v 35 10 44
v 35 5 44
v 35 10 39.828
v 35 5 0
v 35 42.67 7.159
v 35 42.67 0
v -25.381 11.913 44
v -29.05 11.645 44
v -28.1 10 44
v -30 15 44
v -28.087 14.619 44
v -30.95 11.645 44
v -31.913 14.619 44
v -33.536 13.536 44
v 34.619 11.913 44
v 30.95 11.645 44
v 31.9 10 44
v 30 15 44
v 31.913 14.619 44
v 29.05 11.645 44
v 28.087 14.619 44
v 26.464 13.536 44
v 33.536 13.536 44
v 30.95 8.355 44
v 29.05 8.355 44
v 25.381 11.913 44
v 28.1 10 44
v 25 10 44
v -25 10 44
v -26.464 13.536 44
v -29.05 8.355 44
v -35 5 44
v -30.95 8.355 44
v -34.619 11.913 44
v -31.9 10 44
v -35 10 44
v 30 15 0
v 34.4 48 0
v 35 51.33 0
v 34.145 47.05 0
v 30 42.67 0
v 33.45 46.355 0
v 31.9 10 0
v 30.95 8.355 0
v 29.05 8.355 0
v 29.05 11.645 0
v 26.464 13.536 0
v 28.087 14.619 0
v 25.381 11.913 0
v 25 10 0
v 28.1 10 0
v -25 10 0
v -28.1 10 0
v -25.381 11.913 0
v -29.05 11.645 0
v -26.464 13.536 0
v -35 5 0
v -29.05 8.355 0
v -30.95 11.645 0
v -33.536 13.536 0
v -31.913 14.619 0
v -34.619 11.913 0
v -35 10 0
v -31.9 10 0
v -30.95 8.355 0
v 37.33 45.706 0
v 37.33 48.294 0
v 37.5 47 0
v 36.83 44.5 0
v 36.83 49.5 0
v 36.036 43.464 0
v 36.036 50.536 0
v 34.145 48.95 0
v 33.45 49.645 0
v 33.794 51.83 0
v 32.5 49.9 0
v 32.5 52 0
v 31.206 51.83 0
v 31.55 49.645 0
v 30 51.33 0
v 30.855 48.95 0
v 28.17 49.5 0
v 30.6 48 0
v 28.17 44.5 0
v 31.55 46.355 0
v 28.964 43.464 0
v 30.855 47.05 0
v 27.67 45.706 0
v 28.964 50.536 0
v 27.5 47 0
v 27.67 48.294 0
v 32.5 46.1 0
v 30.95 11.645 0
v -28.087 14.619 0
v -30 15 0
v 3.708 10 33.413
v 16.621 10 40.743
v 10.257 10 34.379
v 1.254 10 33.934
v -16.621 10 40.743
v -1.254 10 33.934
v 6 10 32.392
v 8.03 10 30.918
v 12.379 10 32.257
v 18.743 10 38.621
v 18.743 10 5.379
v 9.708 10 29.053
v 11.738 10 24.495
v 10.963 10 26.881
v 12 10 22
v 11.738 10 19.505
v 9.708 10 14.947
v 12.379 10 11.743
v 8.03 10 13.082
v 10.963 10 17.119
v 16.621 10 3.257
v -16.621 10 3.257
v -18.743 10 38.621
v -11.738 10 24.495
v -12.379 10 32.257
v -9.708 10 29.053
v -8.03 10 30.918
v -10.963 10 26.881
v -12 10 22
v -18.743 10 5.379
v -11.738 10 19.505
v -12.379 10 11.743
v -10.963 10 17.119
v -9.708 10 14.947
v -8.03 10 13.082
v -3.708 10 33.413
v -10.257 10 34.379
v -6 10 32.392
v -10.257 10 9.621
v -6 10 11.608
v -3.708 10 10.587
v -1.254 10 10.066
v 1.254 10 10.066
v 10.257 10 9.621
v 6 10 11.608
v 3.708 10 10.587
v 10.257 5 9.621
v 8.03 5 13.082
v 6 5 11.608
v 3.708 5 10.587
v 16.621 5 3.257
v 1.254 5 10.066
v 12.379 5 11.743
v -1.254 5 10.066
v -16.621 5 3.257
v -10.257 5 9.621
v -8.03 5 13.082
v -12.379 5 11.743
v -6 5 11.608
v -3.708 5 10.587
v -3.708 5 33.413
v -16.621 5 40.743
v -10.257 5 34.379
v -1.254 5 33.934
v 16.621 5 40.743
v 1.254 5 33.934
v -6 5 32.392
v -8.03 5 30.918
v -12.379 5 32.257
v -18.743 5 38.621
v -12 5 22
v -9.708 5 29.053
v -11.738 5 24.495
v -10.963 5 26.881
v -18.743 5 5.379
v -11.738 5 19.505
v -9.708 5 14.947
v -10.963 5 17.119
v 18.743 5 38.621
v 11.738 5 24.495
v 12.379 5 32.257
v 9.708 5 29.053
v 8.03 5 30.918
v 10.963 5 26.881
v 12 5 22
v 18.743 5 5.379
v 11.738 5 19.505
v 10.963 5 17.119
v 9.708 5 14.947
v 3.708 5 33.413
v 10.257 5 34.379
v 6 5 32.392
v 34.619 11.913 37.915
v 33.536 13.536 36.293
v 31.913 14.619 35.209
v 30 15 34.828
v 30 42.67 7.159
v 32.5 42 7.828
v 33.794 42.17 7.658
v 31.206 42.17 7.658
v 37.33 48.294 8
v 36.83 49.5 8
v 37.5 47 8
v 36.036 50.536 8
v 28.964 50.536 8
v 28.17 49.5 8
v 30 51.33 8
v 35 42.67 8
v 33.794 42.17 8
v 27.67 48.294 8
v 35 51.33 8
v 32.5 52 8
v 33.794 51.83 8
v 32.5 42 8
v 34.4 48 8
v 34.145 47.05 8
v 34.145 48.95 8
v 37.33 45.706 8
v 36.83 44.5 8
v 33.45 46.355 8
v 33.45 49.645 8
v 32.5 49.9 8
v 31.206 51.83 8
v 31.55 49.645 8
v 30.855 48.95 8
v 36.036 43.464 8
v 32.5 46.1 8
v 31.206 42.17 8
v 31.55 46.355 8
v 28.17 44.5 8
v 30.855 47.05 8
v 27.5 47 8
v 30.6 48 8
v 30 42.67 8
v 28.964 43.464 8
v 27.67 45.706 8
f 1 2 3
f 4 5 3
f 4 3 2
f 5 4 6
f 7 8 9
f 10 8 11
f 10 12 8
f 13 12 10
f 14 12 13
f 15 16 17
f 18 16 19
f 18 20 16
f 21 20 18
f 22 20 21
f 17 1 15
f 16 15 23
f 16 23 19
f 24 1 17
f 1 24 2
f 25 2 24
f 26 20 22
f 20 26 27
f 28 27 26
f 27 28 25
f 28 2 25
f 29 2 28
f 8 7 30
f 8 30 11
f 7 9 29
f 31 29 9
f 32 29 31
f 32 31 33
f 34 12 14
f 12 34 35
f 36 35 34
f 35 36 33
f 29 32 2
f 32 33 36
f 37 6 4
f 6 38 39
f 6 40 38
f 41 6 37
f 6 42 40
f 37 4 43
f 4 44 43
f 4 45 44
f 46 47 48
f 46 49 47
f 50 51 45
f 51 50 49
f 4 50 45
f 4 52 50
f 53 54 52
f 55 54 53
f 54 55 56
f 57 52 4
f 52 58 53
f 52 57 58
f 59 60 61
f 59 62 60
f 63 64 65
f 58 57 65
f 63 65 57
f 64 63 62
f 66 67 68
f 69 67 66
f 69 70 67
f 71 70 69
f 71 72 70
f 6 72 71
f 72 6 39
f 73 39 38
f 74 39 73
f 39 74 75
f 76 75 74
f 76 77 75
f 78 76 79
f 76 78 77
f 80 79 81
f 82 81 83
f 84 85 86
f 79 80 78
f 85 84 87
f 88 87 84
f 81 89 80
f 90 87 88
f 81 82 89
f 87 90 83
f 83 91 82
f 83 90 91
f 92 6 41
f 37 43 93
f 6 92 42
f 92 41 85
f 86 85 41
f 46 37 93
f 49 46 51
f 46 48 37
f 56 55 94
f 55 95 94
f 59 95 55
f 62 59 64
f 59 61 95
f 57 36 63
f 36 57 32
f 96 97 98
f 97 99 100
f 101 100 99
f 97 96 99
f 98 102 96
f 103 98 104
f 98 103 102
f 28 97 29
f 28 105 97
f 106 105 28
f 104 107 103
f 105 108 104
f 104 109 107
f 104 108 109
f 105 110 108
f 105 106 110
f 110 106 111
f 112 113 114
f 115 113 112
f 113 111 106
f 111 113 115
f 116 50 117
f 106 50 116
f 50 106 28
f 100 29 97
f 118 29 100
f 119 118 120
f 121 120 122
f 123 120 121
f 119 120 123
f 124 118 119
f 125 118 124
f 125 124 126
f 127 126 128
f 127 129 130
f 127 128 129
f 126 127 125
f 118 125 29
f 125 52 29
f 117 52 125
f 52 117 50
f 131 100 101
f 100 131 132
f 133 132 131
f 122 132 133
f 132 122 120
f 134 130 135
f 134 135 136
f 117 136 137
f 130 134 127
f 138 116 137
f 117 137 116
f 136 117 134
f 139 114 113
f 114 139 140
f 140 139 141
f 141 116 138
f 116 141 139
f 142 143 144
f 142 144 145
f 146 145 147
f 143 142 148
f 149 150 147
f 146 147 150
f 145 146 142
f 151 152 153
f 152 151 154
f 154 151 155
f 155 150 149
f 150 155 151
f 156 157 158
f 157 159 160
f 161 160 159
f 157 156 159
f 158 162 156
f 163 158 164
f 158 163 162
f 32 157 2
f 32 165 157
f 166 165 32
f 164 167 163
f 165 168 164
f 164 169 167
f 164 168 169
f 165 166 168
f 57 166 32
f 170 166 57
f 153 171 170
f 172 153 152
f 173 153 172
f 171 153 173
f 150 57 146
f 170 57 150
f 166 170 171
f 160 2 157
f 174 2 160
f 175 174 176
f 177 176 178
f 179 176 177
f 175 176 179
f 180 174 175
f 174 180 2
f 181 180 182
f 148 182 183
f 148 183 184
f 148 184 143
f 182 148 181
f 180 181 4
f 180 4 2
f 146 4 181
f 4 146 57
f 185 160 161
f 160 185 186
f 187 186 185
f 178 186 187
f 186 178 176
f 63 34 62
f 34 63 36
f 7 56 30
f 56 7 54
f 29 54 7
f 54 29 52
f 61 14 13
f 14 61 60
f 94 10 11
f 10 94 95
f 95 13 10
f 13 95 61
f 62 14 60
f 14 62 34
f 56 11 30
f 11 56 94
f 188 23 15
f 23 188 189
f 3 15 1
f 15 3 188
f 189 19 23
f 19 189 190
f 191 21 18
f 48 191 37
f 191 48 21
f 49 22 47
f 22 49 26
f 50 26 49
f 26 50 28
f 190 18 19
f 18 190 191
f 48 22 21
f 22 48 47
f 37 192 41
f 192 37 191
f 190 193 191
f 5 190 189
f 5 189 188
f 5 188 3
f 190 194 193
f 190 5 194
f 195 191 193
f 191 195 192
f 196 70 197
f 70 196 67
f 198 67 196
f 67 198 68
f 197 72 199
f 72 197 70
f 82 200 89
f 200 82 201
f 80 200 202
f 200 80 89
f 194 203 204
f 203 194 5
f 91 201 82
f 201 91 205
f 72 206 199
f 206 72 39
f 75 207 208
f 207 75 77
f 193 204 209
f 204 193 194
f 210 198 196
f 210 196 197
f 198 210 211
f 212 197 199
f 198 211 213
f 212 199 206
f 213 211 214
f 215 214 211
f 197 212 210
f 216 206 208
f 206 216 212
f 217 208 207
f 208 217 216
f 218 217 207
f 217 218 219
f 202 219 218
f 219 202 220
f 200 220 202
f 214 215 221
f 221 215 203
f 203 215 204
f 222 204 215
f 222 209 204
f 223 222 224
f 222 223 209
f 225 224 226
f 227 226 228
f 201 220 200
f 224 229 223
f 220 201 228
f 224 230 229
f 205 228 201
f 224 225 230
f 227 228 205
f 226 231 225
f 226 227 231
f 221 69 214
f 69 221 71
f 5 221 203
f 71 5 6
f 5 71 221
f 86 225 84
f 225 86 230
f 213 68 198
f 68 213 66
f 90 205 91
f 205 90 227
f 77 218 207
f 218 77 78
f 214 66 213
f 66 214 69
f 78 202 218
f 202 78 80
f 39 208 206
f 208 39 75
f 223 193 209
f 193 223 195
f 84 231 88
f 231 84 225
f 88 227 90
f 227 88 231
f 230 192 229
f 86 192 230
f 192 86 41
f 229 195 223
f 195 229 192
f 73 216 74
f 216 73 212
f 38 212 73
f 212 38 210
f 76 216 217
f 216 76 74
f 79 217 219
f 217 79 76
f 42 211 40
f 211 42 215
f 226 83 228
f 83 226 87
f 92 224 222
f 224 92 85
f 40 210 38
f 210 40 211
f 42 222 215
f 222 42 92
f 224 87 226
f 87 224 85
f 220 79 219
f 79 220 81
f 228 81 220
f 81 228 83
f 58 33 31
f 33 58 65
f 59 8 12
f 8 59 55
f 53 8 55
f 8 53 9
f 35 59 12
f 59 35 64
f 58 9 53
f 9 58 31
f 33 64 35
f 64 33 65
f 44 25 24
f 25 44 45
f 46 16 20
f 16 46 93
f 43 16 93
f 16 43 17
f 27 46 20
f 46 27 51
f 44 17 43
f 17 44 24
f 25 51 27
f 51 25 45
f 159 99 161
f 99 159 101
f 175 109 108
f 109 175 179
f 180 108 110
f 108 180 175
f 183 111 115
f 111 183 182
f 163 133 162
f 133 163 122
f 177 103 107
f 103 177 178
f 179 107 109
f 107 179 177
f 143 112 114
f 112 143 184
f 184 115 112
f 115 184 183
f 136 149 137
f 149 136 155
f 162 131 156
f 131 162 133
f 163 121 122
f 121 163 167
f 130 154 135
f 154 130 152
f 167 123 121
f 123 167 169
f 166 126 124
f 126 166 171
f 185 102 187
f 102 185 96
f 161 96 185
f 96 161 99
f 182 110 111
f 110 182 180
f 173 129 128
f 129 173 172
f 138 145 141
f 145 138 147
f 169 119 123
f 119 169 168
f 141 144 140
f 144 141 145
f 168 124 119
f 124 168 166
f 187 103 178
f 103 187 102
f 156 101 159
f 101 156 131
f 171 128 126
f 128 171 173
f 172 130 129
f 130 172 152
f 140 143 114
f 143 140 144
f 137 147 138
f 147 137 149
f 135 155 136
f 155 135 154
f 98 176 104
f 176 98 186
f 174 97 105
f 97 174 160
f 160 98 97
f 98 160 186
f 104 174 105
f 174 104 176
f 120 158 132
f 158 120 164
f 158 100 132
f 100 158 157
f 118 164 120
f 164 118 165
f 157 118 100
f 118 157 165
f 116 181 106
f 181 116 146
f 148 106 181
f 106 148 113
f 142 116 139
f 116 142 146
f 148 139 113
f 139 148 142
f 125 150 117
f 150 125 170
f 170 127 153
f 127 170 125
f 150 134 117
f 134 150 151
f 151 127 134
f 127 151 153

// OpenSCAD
h = 44; // Total height.
m = 29; // Motor mounting screws distance (center to center)
w = 60; // Smooth rod distance (center to center)

module wall(h){
    union() {
      translate([0, 7.5, 0]) cube([w+10, 5, h], center=true);
      // Sandwich mount.
      translate([-w/2, 10, 0]) cylinder(r=5, h=h, center=true);
      translate([w/2, 10, 0]) cylinder(r=5, h=h, center=true);
    }
}


module motor_end(holes=true,rightfin=true){
    
    array_fins = [32.5];
    if(rightfin){
        array_fins = [-32.5, 32.5];
    }
      
    translate([0, 0, h/2]) 
    difference() {
    union() {
      wall(h);
      
      for (x = array_fins) {
        // Diagonal fins.
        translate([x, 25, 0]) intersection() {
          cube([5, 37, h], center=true);
          rotate([45, 0, 0]) translate([0, -48, 0])cube([20, 100, 100], center=true);
        }
        // Extra mounting screw holes.
        if(holes){
            translate([x, 47, 4-h/2]) difference() {
                cylinder(r=5, h=8, center=true, $fn=24);
                translate([0, 1, 0]) cylinder(r=1.9, h=9, center=true, $fn=12);
            }
        }
      }
    }
    // Sandwich mount.
    if(holes){
        translate([-w/2, 10, 0]) cylinder(r=1.9, h=h+1, center=true);
        translate([w/2, 10, 0]) cylinder(r=1.9, h=h+1, center=true);
    }else{
        translate([-w/2, 10, h-20]) cylinder(r=1.9, h=h, center=true);
        translate([w/2, 10, h-20]) cylinder(r=1.9, h=h, center=true);
    }
    
    // Motor shaft
    rotate([90, 0, 0]) cylinder(r=12, h=40, center=true);
    // Motor mounting screw slots
    translate([m/2, 0, m/2]) rotate([0, -45, 0])cube([9, 40, 3], center=true);
    translate([-m/2, 0, m/2]) rotate([0, 45, 0])cube([9, 40, 3], center=true);
    translate([m/2, 0, -m/2]) rotate([0, 45, 0])cube([9, 40, 3], center=true);
    translate([-m/2, 0, -m/2]) rotate([0, -45, 0])cube([9, 40, 3], center=true);
  }
}

motor_end(true,true);
